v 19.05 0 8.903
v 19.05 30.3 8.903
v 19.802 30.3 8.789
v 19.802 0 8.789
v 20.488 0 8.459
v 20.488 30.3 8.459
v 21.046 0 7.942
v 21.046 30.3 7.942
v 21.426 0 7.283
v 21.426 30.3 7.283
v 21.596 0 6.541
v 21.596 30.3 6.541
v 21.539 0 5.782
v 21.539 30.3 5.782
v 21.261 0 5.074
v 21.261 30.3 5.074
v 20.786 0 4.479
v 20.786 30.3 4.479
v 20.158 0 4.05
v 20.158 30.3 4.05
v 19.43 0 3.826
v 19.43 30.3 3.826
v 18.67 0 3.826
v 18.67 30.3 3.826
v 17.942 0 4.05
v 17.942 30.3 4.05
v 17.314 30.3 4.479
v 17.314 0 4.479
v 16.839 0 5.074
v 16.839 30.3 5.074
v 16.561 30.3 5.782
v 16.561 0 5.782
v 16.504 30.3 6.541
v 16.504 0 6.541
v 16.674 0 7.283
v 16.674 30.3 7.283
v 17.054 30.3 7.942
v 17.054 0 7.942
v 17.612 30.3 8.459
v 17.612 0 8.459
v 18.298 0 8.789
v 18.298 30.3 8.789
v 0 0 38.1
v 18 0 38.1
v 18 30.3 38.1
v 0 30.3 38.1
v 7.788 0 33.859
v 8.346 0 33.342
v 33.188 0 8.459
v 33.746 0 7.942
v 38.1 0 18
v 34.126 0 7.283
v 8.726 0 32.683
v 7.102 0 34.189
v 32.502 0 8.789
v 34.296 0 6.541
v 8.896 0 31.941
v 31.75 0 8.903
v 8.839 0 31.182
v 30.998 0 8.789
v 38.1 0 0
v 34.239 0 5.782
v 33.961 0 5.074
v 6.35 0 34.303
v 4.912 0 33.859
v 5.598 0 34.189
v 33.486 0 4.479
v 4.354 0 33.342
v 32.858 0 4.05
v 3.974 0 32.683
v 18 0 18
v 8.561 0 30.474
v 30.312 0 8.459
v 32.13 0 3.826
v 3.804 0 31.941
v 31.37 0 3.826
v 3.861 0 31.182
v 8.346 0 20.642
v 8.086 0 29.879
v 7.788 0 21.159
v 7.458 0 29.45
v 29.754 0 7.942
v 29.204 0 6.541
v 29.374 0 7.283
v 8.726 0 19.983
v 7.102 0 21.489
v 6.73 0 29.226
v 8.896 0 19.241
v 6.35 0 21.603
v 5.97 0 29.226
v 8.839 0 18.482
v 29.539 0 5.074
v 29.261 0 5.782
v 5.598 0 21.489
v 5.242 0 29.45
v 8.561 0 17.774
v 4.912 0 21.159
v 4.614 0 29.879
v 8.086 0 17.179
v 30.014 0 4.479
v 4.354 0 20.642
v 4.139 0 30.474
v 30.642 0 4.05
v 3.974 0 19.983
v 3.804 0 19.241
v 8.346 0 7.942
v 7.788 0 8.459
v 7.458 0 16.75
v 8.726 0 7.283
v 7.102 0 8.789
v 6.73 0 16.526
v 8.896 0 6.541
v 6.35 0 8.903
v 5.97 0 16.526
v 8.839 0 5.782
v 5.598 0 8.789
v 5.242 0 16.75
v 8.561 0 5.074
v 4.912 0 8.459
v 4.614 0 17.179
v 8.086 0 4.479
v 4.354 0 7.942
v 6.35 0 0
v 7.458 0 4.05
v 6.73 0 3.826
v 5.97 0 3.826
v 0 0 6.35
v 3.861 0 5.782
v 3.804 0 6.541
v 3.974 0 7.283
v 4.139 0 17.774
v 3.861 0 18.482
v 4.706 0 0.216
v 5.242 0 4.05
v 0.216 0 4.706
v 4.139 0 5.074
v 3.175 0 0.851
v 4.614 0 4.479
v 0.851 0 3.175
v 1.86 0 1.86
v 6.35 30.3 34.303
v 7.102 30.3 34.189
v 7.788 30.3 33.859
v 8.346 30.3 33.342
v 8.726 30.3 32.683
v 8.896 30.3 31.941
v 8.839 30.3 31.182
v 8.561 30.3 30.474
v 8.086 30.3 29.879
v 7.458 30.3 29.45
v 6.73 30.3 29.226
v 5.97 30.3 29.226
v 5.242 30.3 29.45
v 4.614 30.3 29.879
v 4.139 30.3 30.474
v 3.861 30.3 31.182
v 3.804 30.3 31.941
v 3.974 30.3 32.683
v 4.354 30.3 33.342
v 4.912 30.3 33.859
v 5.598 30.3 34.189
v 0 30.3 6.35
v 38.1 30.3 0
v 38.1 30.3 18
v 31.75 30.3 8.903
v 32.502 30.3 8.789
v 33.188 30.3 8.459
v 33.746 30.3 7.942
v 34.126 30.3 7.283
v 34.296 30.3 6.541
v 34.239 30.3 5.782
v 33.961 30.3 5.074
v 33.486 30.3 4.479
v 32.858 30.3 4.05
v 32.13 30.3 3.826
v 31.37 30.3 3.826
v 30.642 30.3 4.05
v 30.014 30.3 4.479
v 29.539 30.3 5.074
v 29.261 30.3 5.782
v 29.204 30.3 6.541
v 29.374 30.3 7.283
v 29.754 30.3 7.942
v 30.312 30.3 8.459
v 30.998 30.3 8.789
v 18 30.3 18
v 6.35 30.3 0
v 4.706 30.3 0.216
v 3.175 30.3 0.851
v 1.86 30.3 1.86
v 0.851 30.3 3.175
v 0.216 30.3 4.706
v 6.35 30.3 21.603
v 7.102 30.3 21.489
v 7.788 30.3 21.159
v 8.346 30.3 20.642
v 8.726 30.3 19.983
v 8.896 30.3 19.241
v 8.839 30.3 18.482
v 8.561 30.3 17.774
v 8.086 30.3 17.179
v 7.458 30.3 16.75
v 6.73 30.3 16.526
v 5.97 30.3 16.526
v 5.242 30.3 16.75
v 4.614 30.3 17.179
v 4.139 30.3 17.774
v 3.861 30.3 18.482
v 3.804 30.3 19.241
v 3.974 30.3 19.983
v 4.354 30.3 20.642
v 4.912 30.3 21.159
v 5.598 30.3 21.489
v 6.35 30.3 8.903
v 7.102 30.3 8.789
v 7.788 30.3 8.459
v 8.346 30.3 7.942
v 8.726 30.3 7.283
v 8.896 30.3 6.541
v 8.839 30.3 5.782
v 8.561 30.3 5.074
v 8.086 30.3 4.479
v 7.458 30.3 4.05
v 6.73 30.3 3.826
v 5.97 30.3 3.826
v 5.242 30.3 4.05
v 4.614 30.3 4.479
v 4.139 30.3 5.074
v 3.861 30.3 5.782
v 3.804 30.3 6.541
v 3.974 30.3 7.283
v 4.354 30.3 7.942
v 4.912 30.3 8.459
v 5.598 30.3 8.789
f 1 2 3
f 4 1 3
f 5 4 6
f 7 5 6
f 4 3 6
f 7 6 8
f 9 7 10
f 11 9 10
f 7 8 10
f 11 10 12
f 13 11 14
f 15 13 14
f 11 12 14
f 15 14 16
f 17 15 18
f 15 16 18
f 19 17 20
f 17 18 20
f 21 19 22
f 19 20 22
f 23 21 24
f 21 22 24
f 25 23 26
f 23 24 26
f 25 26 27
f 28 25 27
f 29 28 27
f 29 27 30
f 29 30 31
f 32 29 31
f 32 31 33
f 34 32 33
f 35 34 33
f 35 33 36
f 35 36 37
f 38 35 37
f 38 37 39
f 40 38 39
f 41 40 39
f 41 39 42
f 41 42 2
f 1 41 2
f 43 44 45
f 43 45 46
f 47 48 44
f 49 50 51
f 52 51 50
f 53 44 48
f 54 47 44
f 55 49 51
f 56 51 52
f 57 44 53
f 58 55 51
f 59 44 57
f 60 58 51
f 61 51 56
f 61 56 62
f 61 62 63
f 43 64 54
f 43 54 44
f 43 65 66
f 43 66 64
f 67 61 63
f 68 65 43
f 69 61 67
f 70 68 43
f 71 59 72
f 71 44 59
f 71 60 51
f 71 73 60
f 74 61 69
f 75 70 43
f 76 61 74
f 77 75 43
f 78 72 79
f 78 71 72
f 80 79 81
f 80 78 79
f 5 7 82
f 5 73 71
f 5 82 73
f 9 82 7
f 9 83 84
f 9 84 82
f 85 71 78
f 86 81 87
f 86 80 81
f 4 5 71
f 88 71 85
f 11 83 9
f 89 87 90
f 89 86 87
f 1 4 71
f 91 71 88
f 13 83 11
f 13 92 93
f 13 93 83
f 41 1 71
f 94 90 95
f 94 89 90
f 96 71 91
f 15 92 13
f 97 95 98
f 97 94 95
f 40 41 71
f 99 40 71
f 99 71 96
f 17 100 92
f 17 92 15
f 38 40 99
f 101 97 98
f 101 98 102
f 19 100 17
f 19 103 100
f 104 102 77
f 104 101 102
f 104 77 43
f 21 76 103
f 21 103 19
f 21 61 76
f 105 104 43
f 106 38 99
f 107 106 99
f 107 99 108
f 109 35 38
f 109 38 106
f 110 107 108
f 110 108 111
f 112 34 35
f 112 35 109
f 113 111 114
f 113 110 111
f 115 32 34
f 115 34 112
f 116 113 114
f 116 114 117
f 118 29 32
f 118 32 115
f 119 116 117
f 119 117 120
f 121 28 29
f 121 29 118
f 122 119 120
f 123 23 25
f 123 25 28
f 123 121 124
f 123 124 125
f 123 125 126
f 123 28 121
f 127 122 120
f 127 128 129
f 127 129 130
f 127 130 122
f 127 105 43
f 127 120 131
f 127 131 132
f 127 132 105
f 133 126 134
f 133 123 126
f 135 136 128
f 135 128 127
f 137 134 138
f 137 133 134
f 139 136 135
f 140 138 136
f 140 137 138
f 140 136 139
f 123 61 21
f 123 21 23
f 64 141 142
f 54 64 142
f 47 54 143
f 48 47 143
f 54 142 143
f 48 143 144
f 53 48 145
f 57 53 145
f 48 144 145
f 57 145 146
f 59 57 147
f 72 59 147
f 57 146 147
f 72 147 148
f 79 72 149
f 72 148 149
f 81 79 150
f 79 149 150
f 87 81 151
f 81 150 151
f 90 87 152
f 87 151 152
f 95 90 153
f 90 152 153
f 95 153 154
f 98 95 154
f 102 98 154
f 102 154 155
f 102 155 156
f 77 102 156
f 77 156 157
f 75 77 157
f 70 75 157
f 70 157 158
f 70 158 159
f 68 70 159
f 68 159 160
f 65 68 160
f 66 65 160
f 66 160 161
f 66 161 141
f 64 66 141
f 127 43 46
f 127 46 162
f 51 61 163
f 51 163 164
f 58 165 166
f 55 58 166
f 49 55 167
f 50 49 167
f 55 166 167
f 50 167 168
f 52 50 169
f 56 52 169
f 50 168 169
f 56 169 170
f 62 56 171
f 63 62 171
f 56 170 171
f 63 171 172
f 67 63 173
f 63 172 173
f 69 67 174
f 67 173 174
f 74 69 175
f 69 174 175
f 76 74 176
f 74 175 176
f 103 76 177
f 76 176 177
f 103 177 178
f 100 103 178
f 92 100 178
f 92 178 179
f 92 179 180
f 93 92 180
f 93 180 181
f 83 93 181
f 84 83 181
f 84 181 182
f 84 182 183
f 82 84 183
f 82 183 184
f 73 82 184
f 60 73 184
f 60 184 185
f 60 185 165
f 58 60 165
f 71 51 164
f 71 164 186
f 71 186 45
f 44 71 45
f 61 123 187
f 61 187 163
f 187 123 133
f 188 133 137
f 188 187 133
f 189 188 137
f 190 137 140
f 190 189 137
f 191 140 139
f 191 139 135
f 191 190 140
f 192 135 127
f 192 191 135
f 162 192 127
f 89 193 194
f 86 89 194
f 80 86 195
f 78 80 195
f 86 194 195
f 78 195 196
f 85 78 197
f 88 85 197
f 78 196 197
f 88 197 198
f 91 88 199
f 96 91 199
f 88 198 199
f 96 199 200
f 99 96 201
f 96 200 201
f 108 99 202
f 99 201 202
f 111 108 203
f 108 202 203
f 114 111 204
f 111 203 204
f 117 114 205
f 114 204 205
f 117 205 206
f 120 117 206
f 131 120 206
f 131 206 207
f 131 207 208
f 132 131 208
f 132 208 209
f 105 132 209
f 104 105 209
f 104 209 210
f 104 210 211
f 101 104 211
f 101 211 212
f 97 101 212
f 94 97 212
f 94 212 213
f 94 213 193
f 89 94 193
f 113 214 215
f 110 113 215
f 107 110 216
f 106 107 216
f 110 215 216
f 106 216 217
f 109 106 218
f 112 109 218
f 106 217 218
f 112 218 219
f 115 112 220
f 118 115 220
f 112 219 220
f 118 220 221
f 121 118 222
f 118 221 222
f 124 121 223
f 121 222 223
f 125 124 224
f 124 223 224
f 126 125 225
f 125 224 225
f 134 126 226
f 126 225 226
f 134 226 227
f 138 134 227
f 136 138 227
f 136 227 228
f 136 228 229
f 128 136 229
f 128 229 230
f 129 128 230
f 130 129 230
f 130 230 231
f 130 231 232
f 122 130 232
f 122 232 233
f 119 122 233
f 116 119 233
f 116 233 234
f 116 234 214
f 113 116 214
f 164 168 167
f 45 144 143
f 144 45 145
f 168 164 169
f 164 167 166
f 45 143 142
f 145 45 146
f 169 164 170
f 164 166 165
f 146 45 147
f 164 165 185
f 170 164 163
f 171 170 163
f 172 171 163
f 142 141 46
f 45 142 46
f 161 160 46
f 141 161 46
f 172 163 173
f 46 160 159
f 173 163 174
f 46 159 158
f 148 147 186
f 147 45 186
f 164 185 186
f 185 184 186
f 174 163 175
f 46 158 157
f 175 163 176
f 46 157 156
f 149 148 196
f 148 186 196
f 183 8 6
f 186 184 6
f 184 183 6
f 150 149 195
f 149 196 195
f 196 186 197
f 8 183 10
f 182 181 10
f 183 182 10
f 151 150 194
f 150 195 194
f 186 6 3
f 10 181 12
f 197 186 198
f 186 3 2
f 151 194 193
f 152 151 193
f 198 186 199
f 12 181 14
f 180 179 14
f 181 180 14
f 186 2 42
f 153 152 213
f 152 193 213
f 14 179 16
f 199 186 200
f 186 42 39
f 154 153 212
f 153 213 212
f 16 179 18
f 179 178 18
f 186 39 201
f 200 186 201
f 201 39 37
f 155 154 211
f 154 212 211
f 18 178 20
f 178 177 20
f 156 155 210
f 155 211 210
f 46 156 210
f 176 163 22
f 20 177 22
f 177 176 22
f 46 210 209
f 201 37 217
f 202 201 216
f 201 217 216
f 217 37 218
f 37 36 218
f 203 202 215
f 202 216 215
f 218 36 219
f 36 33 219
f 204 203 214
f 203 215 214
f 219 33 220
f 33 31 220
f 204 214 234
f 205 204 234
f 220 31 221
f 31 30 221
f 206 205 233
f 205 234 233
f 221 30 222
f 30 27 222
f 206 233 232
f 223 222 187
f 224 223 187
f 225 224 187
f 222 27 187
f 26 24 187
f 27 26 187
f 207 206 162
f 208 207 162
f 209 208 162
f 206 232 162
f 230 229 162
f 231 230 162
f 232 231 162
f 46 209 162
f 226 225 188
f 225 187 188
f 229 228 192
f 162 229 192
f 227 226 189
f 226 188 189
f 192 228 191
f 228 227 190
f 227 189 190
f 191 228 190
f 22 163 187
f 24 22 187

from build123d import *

# Parameters (mm, degrees)
BOSS_EXTRUDE1_DEPTH = 30.3
SKETCH2_R           = 2.5527
CUT_EXTRUDE1_DEPTH  = 62.816745304
CUT_EXTRUDE2_DEPTH  = 62.816745304


with BuildPart() as part:
    # Sketch1 → Boss-Extrude1 (new body)
    with BuildSketch(Plane(origin=(0, 0, 0), x_dir=(1, 0, 0), z_dir=(0, 1, 0))):
        Polygon((0, 0), (38.1, 0), (38.1, -18), (18, -18), (18, -38.1), (0, -38.1), align=None)
    extrude(amount=BOSS_EXTRUDE1_DEPTH)

    # Sketch2 → Cut-Extrude1 (cut, through all)
    with BuildSketch(Plane(origin=(0, 30.3, 0), x_dir=(1, 0, 0), z_dir=(0, 1, 0))):
        with Locations(Location((6.35, -6.35, 0), (0, 0, 270))):
            Circle(SKETCH2_R)
        with Locations(Location((19.05, -6.35, 0), (0, 0, 270))):
            Circle(SKETCH2_R)
        with Locations(Location((31.75, -6.35, 0), (0, 0, 270))):
            Circle(SKETCH2_R)
        with Locations(Location((6.35, -19.05, 0), (0, 0, 270))):
            Circle(SKETCH2_R)
        with Locations(Location((6.35, -31.75, 0), (0, 0, 270))):
            Circle(SKETCH2_R)
    extrude(amount=-CUT_EXTRUDE1_DEPTH, mode=Mode.SUBTRACT)

    # Sketch3 → Cut-Extrude2 (cut, through all)
    with BuildSketch(Plane(origin=(0, 30.3, 0), x_dir=(1, 0, 0), z_dir=(0, 1, 0))):
        with BuildLine():
            Line((0, -6.35), (-3.023343313, -6.35))
            Line((-3.023343313, -6.35), (-3.023343313, 2.931868043))
            Line((-3.023343313, 2.931868043), (6.35, 2.931868043))
            Line((6.35, 2.931868043), (6.35, 0))
            ThreePointArc((6.35, 0), (1.859871939, -1.859871939), (0, -6.35))
        make_face()
    extrude(amount=-CUT_EXTRUDE2_DEPTH, mode=Mode.SUBTRACT)


solid = part.part
